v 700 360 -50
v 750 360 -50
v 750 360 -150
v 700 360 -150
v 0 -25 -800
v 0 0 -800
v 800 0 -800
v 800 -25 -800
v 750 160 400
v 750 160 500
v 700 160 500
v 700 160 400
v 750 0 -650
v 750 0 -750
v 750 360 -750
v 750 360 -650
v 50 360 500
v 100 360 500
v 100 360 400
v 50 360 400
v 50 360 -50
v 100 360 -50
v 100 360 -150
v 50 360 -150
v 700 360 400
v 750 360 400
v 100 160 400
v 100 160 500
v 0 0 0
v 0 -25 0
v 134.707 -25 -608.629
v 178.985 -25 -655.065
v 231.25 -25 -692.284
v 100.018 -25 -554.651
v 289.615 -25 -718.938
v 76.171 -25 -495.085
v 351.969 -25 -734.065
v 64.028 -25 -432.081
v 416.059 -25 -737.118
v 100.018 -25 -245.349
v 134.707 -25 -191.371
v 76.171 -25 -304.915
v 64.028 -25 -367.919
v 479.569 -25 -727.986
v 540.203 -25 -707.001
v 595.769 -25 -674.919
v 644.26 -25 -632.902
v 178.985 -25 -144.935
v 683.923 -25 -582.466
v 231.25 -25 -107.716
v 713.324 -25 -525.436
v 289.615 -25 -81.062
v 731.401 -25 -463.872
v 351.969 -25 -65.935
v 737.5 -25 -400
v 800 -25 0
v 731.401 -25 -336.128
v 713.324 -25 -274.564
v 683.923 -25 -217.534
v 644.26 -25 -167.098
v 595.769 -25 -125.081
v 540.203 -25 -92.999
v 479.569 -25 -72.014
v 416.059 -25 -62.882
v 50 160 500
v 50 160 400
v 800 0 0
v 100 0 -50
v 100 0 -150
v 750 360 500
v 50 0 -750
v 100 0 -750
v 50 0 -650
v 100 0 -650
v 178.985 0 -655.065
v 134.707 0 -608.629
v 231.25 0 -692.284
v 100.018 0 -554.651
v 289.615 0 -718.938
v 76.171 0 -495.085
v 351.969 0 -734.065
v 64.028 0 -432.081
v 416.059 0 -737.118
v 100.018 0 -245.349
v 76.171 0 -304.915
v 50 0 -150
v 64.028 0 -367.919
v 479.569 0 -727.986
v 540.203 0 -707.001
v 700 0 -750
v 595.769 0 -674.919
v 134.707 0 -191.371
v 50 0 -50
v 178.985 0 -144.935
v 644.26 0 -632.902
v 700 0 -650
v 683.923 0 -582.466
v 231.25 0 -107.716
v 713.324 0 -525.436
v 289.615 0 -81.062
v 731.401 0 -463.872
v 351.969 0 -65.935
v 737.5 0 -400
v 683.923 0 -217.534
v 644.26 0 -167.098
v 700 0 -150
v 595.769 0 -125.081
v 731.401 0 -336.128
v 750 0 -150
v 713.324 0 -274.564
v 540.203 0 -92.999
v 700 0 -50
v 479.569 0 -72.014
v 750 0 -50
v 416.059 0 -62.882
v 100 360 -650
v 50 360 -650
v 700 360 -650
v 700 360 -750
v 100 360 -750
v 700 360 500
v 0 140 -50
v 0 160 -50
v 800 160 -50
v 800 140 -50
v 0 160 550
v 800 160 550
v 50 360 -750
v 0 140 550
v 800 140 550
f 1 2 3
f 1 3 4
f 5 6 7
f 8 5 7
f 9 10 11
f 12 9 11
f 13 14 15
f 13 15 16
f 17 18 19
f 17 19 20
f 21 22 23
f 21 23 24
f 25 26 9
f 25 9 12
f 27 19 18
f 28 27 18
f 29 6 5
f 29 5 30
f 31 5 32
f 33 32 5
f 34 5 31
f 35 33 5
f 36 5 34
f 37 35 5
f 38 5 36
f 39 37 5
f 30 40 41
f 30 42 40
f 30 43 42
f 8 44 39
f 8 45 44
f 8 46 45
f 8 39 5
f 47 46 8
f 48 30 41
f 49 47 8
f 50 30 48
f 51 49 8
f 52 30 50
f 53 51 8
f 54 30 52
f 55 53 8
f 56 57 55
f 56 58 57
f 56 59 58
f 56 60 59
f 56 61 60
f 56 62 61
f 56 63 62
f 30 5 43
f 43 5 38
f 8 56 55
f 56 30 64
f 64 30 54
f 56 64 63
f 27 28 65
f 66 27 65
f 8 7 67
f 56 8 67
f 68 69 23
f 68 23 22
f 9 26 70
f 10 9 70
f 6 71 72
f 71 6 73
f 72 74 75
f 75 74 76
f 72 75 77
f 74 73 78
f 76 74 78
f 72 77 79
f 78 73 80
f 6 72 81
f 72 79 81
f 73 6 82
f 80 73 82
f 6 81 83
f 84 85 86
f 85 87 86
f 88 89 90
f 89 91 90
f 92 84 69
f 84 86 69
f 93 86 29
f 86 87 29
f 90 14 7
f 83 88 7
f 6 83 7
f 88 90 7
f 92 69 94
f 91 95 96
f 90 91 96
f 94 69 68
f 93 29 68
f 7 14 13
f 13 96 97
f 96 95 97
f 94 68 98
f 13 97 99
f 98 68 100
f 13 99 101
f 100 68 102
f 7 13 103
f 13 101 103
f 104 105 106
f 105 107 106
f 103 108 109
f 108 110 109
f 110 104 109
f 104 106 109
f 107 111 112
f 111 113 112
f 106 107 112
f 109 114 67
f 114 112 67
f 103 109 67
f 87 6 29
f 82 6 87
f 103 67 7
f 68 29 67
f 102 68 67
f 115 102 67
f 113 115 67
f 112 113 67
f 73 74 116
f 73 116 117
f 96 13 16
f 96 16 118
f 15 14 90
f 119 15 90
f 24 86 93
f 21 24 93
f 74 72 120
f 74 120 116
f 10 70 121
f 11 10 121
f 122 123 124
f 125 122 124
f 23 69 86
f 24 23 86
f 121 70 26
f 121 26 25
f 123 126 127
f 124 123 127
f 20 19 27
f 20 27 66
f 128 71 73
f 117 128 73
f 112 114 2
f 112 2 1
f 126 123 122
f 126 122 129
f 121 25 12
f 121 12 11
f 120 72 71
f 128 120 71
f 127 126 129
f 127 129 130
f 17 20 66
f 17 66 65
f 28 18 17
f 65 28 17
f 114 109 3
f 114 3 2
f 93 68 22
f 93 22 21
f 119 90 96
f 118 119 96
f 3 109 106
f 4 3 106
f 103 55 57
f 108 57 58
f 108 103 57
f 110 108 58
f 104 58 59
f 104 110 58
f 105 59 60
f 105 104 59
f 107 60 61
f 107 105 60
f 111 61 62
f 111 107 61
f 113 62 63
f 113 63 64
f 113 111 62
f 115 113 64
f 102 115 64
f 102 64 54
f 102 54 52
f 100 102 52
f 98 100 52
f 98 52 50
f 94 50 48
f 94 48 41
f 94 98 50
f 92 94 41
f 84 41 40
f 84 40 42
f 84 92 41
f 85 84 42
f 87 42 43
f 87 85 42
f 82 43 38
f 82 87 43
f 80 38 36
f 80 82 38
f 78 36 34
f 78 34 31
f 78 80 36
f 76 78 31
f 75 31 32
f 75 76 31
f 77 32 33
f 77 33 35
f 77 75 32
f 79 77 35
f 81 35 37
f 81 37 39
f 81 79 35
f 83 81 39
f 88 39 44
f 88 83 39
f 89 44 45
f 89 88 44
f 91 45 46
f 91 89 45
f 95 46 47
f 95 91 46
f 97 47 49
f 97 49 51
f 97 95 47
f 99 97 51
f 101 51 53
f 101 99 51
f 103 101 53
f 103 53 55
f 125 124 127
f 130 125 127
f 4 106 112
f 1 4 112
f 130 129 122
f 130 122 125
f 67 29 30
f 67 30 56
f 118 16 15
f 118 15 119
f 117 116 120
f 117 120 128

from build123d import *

# Parameters (mm, degrees)
F0_W     = 800
F0_H     = 800
F0_R     = 337.5
F1_DEPTH = 25
F2_W     = 50
F2_H     = 100
F3_DEPTH = 360
F4_W     = 50
F4_H     = 100
F5_DEPTH = 200
F6_W     = 800
F6_H     = 600
F7_DEPTH = 20


with BuildPart() as f1:
    # F0 (on Front) → F1 (new body)
    with BuildSketch(Plane.XZ):
        with Locations((400, -400)):
            Rectangle(F0_W, F0_H)
        with Locations((400, -400)):
            Circle(F0_R, mode=Mode.SUBTRACT)
    extrude(amount=F1_DEPTH)

    # F2 (on face) → F3 (join)
    with BuildSketch(Plane(origin=(0, 0, 0), x_dir=(-1, 0, 0), z_dir=(0, 1, 0))):
        with Locations((-725, -100)):
            Rectangle(F2_W, F2_H)
        with Locations((-725, -700)):
            Rectangle(F2_W, F2_H)
        with Locations((-75, -100)):
            Rectangle(F2_W, F2_H)
        with Locations((-75, -700)):
            Rectangle(F2_W, F2_H)
    extrude(amount=F3_DEPTH)


with BuildPart() as f5:
    # F4 (on face) → F5 (new body)
    with BuildSketch(Plane(origin=(0, 360, 0), x_dir=(-1, 0, 0), z_dir=(0, 1, 0))):
        with Locations((-725, 450)):
            Rectangle(F4_W, F4_H)
        with Locations((-75, 450)):
            Rectangle(F4_W, F4_H)
    extrude(amount=-F5_DEPTH)


with BuildPart() as f7:
    # F6 (on face) → F7 (new body)
    with BuildSketch(Plane.XZ.offset(-160)):
        with Locations((400, 250)):
            Rectangle(F6_W, F6_H)
    extrude(amount=F7_DEPTH)


solid = Compound([f1.part, f5.part, f7.part])
